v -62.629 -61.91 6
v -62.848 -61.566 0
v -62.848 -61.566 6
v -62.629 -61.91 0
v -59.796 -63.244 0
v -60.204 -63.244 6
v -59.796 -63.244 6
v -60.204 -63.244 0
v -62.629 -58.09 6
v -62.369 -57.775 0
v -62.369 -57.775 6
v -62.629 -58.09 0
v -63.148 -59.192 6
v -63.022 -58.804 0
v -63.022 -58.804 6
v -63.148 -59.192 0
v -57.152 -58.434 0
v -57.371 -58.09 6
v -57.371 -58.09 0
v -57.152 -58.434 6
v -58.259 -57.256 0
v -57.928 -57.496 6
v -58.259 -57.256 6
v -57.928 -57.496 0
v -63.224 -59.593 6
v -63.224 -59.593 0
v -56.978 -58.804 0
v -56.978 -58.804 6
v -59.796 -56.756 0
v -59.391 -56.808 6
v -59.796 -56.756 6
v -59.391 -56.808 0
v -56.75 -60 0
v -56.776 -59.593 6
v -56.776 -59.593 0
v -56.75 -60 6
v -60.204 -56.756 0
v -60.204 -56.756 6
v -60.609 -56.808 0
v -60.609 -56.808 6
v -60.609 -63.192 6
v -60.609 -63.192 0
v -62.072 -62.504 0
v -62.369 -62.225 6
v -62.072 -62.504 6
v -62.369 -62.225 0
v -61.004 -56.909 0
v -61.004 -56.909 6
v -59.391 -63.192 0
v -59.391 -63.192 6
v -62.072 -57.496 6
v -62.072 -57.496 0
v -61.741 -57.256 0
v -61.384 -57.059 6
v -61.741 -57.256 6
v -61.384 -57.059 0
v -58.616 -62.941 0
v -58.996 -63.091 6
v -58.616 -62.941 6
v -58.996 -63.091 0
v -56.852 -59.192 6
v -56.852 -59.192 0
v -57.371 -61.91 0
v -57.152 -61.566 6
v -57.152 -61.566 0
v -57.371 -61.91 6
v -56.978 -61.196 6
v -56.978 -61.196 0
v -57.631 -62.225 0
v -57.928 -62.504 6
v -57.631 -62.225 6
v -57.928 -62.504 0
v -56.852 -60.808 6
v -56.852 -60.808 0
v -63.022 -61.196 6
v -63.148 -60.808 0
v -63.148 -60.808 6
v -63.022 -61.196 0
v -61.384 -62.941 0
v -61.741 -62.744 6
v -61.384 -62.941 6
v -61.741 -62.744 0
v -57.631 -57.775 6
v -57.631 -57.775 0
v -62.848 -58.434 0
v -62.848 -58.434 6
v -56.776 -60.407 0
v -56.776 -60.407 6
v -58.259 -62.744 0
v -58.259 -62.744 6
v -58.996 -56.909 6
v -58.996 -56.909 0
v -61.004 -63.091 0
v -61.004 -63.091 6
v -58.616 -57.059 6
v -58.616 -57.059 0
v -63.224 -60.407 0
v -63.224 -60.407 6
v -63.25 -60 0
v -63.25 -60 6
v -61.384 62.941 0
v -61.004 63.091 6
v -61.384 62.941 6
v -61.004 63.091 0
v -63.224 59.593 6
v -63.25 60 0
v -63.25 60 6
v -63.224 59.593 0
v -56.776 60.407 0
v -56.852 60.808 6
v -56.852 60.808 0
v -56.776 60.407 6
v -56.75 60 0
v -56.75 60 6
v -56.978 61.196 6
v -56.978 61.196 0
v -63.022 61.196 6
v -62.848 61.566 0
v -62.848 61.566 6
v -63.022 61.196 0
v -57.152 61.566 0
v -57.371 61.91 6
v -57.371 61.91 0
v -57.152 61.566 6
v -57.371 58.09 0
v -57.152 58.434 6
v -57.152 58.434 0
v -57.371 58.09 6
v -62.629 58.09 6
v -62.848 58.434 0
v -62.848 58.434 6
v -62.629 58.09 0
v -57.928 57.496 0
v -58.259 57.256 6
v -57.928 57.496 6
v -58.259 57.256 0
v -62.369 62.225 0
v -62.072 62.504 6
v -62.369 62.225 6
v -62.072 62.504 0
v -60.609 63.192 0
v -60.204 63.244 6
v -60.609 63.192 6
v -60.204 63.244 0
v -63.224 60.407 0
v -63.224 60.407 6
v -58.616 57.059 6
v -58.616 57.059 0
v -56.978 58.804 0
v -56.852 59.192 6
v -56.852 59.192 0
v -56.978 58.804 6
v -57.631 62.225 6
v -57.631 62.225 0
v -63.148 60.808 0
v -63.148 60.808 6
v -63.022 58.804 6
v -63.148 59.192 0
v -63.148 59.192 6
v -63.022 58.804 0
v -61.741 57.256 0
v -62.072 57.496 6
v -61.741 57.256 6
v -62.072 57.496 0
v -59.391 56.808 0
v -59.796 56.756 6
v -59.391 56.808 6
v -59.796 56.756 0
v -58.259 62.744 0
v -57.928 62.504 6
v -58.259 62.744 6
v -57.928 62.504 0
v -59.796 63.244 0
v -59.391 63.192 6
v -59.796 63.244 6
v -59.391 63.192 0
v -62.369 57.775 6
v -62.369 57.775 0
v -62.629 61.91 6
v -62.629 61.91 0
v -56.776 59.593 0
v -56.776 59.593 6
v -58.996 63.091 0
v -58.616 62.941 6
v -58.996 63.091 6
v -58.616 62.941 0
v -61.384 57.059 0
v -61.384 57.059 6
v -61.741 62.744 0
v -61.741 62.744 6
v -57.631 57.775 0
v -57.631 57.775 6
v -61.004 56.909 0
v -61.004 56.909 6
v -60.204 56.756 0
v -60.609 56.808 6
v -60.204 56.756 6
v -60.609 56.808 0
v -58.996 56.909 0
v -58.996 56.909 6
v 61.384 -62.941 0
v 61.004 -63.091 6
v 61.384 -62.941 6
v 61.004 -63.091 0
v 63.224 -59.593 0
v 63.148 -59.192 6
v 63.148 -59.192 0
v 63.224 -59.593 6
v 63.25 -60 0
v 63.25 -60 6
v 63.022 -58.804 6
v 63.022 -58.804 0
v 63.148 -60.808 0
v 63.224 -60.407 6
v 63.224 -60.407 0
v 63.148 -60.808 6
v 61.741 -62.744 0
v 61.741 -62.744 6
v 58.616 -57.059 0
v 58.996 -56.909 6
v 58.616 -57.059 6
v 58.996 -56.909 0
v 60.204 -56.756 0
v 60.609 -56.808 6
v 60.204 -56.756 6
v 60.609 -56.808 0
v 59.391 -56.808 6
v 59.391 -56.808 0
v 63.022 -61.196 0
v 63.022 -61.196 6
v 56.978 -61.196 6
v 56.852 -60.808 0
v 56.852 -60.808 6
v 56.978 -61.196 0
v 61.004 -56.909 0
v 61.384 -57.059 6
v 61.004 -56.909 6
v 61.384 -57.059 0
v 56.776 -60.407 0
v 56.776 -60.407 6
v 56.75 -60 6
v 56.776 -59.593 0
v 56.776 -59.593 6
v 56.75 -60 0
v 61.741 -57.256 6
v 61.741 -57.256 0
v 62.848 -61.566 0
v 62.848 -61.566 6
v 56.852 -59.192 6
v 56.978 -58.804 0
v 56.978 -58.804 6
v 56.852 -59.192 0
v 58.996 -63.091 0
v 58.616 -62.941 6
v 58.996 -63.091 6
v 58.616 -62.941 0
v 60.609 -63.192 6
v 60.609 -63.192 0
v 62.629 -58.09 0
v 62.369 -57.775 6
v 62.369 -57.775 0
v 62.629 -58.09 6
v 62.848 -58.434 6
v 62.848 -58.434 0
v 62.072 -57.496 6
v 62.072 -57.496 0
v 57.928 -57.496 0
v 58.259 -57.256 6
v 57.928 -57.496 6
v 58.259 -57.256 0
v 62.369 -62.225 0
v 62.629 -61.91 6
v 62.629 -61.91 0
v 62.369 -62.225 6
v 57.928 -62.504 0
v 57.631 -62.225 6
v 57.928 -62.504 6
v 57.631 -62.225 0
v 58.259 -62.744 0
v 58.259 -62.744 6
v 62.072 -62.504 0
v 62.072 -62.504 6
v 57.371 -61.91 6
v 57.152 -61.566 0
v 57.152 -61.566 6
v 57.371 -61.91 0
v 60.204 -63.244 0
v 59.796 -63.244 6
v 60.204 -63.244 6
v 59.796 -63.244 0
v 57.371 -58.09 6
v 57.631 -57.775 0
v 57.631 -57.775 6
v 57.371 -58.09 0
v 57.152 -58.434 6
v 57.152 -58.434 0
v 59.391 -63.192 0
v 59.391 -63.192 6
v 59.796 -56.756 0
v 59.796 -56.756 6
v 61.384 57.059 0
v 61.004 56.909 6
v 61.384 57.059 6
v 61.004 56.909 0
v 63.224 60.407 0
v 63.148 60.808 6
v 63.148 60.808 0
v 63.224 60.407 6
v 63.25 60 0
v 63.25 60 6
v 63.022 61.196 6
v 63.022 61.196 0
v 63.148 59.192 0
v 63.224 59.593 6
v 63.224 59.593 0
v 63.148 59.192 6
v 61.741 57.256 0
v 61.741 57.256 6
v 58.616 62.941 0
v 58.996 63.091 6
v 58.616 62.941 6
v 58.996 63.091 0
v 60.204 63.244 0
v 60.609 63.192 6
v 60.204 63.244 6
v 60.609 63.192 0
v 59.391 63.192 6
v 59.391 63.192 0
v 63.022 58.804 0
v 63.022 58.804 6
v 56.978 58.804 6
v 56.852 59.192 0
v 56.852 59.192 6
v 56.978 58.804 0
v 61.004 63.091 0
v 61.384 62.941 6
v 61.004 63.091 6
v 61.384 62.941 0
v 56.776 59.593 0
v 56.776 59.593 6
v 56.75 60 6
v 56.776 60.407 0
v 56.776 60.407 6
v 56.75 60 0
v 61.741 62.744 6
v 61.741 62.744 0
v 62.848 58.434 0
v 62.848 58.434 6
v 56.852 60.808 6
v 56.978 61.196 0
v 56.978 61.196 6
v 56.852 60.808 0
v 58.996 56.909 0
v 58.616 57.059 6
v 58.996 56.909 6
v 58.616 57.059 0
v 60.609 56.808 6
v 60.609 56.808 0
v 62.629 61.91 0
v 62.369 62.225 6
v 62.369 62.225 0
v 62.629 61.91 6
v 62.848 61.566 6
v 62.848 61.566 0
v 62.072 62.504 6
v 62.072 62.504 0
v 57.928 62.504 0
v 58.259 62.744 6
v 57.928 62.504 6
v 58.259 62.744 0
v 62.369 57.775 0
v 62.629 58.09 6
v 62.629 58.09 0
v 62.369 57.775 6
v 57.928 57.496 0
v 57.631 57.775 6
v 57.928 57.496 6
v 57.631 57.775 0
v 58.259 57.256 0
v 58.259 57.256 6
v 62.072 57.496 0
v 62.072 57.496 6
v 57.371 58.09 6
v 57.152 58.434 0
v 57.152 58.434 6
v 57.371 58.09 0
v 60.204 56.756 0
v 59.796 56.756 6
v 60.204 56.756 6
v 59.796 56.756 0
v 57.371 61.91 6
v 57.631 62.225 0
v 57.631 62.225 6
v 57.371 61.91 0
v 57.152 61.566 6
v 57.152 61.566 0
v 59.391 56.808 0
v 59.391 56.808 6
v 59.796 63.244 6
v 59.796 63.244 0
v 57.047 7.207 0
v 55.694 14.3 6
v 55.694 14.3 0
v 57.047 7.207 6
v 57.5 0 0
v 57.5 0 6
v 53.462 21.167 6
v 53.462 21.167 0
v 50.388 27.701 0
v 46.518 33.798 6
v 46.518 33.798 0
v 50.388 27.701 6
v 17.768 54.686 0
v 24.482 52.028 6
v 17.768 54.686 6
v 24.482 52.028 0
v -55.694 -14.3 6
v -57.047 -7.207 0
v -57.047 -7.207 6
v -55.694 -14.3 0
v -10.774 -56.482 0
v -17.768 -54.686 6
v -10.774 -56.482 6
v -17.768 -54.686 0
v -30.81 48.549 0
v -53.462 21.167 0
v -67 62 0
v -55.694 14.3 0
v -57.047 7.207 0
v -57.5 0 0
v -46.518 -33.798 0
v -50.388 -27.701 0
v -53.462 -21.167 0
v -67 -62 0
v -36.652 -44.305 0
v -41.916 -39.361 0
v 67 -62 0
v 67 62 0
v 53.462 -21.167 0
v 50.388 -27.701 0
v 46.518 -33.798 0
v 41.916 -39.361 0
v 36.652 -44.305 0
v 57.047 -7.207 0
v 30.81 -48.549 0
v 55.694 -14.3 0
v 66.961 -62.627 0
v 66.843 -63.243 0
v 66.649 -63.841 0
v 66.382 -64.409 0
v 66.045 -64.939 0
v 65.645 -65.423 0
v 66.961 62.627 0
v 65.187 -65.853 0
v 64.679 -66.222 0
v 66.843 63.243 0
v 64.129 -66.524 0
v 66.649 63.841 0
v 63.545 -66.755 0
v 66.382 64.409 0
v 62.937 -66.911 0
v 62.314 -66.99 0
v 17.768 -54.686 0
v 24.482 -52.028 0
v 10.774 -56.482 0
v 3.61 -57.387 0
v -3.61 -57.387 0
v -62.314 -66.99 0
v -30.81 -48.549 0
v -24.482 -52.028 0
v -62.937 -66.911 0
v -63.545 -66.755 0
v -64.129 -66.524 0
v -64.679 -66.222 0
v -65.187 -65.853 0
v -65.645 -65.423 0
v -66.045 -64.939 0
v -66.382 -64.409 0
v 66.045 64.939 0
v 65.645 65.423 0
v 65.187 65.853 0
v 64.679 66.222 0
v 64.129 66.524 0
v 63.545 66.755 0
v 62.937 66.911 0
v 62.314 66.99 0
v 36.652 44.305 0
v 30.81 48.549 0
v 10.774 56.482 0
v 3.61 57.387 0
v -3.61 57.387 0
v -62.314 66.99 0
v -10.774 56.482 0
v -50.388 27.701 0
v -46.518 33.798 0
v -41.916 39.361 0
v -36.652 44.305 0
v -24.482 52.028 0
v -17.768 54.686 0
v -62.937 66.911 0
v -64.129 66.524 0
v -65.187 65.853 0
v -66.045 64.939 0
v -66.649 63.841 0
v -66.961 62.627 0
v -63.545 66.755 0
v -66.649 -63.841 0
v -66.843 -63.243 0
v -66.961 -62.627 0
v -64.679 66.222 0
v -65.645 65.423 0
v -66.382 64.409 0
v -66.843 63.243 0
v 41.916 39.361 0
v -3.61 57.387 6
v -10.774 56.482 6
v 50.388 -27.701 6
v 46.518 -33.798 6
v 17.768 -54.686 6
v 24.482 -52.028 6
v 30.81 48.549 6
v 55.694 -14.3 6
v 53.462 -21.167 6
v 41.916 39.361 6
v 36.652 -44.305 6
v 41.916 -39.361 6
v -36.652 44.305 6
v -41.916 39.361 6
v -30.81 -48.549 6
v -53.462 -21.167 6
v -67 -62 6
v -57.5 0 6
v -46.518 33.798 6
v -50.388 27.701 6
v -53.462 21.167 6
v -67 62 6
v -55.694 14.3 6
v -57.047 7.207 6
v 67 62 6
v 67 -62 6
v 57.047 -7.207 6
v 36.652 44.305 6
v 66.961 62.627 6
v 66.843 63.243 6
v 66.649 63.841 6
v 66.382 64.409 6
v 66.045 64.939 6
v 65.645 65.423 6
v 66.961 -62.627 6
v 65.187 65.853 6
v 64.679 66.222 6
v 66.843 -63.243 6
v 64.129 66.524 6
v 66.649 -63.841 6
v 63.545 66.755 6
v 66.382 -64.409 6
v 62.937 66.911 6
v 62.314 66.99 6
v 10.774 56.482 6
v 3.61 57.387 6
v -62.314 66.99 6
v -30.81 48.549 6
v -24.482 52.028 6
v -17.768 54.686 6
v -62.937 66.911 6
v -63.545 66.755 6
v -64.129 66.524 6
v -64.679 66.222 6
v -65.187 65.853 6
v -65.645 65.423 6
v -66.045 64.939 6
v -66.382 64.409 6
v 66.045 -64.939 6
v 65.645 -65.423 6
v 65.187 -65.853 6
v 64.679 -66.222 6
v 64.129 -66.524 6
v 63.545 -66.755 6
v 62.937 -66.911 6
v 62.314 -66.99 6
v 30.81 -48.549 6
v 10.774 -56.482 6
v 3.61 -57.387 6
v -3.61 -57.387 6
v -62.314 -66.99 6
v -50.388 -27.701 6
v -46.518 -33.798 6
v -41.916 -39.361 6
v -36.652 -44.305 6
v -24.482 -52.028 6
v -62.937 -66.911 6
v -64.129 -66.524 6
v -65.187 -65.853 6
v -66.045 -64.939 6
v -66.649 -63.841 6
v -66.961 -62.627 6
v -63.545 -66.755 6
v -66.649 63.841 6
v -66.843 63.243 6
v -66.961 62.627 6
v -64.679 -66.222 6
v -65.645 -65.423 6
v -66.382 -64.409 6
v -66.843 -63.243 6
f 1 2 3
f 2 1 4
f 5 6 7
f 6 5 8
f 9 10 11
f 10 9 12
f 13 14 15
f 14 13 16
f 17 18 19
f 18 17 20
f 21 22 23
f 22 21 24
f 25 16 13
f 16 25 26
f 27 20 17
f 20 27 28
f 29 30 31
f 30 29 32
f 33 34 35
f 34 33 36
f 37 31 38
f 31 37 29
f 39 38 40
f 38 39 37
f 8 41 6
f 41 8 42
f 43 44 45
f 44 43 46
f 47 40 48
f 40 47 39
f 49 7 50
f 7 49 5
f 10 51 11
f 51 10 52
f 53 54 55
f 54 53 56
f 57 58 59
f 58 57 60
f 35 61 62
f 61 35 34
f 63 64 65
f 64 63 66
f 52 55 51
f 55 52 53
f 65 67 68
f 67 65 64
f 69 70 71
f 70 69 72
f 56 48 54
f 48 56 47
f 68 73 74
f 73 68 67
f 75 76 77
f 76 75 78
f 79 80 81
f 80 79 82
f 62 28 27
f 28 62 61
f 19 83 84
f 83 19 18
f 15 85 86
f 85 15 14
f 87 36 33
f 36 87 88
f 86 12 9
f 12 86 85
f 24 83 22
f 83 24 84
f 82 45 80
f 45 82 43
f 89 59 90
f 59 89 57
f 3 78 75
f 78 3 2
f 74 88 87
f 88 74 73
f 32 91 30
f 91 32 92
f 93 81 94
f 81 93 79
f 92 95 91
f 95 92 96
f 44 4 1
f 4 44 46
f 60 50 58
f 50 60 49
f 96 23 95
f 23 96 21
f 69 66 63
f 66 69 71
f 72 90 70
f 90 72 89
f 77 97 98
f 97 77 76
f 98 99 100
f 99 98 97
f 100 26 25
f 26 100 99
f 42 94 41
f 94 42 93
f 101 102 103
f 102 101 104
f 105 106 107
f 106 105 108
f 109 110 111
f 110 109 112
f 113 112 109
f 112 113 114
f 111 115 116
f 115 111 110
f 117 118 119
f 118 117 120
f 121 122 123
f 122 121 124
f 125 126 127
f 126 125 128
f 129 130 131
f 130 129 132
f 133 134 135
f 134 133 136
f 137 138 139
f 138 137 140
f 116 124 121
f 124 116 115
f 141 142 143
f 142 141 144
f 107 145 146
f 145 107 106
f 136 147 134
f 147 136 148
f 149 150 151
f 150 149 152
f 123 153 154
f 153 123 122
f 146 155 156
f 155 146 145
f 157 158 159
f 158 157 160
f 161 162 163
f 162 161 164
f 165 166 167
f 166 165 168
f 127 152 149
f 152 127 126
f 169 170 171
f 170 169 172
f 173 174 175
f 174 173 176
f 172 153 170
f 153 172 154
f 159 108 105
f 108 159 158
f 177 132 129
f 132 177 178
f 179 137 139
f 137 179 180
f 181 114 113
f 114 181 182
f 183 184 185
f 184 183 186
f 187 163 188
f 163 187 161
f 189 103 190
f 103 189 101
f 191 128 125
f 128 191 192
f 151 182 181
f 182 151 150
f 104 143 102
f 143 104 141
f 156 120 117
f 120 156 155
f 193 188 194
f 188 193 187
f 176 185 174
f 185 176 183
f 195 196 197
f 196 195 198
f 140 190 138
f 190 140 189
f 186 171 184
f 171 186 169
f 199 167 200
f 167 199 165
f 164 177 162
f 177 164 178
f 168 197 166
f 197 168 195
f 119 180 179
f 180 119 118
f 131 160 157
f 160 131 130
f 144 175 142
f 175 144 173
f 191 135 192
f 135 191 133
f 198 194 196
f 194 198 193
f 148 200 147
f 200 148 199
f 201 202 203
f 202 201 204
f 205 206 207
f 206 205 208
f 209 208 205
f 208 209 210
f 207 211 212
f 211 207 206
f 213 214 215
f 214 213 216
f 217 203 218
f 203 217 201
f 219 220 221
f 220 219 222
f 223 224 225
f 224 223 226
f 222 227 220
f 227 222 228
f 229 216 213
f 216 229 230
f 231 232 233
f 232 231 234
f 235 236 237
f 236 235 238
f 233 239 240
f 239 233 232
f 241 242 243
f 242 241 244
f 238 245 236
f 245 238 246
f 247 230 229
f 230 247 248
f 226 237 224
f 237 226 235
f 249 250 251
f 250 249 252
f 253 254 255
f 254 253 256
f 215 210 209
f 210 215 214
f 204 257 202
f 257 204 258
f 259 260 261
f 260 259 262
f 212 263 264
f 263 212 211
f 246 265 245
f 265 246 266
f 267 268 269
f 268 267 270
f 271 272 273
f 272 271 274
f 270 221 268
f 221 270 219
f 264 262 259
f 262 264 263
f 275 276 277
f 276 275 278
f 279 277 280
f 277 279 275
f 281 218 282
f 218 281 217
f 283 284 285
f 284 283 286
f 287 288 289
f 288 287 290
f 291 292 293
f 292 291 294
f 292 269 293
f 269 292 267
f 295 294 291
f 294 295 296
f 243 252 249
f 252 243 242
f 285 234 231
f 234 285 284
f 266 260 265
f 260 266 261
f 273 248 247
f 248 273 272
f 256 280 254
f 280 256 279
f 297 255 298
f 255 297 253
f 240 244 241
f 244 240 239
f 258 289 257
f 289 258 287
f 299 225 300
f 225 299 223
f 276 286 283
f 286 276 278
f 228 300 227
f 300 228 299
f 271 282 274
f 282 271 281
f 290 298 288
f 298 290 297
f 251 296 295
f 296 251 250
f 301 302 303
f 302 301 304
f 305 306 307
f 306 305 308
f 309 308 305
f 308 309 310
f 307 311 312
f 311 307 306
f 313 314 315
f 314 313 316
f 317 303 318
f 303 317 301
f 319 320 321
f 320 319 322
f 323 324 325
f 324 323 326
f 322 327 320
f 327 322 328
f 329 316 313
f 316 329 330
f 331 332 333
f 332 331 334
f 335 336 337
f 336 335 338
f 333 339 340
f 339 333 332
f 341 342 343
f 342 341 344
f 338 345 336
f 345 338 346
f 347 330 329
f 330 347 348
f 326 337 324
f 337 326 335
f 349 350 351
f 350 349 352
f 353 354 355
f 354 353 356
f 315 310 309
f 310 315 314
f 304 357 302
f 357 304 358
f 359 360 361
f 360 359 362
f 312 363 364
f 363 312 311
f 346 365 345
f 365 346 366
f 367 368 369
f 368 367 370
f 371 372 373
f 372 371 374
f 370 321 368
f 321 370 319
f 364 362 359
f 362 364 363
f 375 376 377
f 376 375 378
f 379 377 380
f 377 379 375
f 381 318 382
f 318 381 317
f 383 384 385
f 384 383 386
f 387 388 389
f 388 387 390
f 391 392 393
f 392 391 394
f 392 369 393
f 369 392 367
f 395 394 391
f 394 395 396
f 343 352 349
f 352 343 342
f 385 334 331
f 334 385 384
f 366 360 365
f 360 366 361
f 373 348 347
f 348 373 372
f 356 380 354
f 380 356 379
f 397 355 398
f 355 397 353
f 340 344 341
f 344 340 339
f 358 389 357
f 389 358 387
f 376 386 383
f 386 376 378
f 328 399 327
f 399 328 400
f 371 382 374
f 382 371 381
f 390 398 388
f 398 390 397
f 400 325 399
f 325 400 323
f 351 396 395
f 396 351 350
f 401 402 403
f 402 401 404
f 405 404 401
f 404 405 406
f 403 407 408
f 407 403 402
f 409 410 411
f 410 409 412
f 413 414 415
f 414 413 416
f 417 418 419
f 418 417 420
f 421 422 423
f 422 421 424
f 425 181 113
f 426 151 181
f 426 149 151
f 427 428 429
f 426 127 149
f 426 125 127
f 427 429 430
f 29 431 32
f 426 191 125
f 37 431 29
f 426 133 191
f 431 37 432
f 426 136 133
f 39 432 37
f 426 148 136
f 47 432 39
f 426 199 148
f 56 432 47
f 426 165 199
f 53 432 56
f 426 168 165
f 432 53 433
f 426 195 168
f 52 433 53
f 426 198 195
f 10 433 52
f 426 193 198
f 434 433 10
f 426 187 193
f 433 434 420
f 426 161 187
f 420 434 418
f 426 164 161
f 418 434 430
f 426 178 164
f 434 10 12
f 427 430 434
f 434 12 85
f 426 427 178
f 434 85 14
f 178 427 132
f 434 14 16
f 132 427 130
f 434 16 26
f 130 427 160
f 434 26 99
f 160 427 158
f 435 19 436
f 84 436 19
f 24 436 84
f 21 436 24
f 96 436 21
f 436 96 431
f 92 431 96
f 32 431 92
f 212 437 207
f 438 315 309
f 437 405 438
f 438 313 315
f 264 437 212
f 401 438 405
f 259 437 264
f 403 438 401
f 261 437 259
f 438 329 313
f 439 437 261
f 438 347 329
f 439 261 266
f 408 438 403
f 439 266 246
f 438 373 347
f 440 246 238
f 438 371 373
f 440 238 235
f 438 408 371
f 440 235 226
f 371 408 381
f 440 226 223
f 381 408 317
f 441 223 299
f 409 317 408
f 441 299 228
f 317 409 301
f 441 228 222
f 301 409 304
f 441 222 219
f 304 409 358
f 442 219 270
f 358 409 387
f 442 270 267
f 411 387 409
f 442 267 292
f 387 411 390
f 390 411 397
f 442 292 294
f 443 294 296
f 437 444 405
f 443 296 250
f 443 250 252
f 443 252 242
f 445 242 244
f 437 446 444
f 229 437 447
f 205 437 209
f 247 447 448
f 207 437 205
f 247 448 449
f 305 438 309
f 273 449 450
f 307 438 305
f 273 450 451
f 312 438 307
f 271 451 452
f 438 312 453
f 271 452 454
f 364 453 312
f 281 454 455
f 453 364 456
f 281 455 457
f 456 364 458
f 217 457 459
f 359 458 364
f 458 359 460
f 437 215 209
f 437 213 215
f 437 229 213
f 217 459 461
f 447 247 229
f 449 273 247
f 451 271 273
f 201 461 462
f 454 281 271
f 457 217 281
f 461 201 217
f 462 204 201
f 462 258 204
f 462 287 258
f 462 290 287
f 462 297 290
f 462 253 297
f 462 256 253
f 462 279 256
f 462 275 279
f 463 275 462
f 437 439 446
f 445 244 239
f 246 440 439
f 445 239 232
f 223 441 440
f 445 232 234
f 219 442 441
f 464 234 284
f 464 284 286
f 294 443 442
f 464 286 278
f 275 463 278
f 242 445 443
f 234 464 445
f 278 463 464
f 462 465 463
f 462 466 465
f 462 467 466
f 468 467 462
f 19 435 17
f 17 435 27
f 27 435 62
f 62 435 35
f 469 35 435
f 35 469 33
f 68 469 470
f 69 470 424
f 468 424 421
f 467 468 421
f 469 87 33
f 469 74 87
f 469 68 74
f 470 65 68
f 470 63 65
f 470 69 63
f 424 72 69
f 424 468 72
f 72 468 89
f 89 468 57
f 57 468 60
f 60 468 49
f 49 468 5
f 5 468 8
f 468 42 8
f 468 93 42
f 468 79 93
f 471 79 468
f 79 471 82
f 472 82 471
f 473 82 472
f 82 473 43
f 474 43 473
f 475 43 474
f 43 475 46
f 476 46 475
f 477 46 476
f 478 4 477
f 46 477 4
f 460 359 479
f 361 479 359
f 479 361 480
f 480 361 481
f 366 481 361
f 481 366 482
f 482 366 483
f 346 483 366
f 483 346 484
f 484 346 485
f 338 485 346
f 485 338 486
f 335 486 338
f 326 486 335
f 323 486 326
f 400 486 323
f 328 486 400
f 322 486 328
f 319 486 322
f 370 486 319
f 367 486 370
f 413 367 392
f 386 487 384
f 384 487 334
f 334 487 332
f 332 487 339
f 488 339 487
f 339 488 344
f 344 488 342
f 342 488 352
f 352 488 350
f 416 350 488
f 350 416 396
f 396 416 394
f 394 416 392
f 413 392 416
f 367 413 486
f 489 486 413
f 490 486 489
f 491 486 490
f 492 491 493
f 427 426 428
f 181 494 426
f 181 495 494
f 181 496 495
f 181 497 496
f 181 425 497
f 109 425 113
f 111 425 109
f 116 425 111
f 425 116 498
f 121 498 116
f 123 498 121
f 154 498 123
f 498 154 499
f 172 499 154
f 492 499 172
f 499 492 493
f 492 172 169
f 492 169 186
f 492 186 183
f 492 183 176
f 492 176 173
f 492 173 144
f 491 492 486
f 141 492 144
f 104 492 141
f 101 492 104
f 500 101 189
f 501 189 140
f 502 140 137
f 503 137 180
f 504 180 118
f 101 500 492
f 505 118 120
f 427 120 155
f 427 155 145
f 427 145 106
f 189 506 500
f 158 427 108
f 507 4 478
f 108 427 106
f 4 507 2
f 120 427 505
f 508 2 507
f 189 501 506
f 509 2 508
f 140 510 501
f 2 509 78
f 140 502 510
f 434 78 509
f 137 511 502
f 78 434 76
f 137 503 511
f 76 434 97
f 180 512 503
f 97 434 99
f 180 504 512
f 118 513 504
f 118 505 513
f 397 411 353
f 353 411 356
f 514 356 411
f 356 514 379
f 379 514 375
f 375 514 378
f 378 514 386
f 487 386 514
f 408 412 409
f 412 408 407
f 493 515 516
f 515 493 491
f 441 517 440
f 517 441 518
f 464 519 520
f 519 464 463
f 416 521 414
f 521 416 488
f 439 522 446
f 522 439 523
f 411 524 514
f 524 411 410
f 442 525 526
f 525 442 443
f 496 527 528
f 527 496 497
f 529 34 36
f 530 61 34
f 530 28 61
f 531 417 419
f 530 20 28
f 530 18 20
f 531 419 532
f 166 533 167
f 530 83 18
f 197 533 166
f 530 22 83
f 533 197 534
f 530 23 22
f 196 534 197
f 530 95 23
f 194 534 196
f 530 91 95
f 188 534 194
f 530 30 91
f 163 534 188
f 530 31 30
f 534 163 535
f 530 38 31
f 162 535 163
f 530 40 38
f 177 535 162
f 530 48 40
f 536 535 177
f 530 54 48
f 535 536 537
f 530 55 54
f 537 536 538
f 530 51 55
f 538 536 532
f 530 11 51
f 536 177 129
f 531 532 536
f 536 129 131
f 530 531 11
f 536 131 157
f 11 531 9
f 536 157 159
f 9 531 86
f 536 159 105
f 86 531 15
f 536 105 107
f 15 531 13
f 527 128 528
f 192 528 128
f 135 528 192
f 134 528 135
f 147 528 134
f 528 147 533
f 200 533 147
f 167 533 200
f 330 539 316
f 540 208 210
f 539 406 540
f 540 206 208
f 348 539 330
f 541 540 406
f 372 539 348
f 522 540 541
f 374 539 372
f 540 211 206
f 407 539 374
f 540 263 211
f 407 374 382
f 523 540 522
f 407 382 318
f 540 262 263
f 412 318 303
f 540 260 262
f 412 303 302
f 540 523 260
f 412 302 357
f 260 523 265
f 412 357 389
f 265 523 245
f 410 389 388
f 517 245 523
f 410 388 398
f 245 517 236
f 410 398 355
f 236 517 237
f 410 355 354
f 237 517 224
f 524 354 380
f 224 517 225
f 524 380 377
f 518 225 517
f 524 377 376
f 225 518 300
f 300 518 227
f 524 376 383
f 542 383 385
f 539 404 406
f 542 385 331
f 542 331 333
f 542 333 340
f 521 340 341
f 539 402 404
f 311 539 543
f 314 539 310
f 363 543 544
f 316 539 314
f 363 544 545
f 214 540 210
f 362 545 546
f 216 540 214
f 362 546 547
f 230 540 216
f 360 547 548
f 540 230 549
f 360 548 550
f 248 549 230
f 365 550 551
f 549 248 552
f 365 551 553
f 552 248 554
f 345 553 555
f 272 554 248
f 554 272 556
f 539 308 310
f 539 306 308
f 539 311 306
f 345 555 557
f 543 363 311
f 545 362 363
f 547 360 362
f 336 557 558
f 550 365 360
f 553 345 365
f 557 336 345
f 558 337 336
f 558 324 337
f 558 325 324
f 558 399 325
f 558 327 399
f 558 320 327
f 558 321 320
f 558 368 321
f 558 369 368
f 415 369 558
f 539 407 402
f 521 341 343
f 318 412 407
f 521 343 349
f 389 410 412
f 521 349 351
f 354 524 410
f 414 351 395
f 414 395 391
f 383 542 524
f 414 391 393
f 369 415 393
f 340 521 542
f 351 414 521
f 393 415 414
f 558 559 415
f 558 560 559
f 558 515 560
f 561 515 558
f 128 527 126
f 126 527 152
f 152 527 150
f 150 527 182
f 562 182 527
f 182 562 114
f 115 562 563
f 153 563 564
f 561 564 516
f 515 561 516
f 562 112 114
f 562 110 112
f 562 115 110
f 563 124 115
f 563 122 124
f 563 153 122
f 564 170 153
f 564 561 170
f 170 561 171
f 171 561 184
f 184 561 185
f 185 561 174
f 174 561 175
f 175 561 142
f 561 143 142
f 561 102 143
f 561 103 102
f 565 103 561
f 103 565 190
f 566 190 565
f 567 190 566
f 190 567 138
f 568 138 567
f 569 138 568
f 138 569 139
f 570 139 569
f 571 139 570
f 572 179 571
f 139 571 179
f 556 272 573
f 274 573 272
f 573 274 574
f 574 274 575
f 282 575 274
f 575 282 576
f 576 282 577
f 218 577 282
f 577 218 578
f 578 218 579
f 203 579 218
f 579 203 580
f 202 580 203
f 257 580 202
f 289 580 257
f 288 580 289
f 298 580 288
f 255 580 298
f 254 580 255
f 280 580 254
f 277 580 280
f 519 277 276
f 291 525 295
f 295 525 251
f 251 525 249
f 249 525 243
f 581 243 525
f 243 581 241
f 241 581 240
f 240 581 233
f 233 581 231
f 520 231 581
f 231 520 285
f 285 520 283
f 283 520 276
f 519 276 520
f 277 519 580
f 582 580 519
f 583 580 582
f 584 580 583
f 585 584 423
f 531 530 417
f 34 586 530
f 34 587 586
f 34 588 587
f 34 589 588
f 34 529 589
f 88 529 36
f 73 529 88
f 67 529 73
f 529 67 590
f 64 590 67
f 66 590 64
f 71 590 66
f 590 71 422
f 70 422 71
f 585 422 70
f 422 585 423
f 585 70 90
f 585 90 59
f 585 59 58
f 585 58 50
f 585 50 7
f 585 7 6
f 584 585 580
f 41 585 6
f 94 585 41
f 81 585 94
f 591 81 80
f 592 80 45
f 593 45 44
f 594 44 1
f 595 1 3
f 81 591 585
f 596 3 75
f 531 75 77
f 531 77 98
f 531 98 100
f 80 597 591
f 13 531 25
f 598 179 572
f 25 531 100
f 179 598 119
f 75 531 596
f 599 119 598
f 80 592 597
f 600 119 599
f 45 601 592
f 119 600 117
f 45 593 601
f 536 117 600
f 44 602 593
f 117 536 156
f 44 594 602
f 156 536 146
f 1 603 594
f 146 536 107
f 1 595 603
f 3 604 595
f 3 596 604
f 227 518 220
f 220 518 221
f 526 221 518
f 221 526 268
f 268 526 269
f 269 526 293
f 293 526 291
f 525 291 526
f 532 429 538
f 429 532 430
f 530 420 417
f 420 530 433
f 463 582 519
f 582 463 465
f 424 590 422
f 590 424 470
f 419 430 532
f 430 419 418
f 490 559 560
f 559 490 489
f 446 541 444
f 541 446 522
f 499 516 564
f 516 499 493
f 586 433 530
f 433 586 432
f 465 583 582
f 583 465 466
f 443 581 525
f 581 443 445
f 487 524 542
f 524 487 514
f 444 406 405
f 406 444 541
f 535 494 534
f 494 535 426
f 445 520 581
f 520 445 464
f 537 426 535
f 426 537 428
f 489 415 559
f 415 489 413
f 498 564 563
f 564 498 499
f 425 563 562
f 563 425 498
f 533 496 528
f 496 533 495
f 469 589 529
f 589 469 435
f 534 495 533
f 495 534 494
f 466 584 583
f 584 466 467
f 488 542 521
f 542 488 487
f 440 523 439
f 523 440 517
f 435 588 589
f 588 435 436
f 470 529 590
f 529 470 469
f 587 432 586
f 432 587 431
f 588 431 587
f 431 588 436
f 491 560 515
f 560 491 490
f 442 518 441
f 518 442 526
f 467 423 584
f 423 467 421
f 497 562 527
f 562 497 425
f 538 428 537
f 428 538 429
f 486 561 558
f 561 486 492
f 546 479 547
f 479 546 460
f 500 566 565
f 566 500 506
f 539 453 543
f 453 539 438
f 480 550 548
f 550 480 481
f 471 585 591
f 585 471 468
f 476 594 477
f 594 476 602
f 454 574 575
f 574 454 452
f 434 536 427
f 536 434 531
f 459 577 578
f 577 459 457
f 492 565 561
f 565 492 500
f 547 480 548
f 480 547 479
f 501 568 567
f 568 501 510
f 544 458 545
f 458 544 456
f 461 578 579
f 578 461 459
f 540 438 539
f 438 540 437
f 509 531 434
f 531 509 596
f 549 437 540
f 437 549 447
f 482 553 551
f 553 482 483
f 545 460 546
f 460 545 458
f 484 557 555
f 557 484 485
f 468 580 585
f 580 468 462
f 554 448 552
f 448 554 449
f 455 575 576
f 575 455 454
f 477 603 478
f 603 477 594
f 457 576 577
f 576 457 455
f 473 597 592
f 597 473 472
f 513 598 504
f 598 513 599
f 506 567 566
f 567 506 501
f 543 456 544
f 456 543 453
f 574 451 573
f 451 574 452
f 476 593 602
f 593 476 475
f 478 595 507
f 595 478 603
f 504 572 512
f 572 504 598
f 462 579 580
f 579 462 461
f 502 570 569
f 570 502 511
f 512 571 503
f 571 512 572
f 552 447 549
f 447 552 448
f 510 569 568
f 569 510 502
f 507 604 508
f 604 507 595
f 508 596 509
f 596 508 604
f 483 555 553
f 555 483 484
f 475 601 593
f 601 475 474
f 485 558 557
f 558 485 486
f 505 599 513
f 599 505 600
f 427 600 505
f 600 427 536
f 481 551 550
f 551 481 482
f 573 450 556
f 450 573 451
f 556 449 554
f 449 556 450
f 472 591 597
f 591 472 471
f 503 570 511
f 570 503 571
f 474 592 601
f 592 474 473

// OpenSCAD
$fn = 50;


difference() {
	union() {
		hull() {
			translate(v = [-62.0000000000, 62.0000000000, 0]) {
				cylinder(h = 6, r = 5);
			}
			translate(v = [62.0000000000, 62.0000000000, 0]) {
				cylinder(h = 6, r = 5);
			}
			translate(v = [-62.0000000000, -62.0000000000, 0]) {
				cylinder(h = 6, r = 5);
			}
			translate(v = [62.0000000000, -62.0000000000, 0]) {
				cylinder(h = 6, r = 5);
			}
		}
	}
	union() {
		#translate(v = [-60.0000000000, -60.0000000000, -100.0000000000]) {
			cylinder(h = 200, r = 3.2500000000);
		}
		#translate(v = [-60.0000000000, 60.0000000000, -100.0000000000]) {
			cylinder(h = 200, r = 3.2500000000);
		}
		#translate(v = [60.0000000000, -60.0000000000, -100.0000000000]) {
			cylinder(h = 200, r = 3.2500000000);
		}
		#translate(v = [60.0000000000, 60.0000000000, -100.0000000000]) {
			cylinder(h = 200, r = 3.2500000000);
		}
		#cylinder(h = 6, r = 57.5000000000);
	}
}
